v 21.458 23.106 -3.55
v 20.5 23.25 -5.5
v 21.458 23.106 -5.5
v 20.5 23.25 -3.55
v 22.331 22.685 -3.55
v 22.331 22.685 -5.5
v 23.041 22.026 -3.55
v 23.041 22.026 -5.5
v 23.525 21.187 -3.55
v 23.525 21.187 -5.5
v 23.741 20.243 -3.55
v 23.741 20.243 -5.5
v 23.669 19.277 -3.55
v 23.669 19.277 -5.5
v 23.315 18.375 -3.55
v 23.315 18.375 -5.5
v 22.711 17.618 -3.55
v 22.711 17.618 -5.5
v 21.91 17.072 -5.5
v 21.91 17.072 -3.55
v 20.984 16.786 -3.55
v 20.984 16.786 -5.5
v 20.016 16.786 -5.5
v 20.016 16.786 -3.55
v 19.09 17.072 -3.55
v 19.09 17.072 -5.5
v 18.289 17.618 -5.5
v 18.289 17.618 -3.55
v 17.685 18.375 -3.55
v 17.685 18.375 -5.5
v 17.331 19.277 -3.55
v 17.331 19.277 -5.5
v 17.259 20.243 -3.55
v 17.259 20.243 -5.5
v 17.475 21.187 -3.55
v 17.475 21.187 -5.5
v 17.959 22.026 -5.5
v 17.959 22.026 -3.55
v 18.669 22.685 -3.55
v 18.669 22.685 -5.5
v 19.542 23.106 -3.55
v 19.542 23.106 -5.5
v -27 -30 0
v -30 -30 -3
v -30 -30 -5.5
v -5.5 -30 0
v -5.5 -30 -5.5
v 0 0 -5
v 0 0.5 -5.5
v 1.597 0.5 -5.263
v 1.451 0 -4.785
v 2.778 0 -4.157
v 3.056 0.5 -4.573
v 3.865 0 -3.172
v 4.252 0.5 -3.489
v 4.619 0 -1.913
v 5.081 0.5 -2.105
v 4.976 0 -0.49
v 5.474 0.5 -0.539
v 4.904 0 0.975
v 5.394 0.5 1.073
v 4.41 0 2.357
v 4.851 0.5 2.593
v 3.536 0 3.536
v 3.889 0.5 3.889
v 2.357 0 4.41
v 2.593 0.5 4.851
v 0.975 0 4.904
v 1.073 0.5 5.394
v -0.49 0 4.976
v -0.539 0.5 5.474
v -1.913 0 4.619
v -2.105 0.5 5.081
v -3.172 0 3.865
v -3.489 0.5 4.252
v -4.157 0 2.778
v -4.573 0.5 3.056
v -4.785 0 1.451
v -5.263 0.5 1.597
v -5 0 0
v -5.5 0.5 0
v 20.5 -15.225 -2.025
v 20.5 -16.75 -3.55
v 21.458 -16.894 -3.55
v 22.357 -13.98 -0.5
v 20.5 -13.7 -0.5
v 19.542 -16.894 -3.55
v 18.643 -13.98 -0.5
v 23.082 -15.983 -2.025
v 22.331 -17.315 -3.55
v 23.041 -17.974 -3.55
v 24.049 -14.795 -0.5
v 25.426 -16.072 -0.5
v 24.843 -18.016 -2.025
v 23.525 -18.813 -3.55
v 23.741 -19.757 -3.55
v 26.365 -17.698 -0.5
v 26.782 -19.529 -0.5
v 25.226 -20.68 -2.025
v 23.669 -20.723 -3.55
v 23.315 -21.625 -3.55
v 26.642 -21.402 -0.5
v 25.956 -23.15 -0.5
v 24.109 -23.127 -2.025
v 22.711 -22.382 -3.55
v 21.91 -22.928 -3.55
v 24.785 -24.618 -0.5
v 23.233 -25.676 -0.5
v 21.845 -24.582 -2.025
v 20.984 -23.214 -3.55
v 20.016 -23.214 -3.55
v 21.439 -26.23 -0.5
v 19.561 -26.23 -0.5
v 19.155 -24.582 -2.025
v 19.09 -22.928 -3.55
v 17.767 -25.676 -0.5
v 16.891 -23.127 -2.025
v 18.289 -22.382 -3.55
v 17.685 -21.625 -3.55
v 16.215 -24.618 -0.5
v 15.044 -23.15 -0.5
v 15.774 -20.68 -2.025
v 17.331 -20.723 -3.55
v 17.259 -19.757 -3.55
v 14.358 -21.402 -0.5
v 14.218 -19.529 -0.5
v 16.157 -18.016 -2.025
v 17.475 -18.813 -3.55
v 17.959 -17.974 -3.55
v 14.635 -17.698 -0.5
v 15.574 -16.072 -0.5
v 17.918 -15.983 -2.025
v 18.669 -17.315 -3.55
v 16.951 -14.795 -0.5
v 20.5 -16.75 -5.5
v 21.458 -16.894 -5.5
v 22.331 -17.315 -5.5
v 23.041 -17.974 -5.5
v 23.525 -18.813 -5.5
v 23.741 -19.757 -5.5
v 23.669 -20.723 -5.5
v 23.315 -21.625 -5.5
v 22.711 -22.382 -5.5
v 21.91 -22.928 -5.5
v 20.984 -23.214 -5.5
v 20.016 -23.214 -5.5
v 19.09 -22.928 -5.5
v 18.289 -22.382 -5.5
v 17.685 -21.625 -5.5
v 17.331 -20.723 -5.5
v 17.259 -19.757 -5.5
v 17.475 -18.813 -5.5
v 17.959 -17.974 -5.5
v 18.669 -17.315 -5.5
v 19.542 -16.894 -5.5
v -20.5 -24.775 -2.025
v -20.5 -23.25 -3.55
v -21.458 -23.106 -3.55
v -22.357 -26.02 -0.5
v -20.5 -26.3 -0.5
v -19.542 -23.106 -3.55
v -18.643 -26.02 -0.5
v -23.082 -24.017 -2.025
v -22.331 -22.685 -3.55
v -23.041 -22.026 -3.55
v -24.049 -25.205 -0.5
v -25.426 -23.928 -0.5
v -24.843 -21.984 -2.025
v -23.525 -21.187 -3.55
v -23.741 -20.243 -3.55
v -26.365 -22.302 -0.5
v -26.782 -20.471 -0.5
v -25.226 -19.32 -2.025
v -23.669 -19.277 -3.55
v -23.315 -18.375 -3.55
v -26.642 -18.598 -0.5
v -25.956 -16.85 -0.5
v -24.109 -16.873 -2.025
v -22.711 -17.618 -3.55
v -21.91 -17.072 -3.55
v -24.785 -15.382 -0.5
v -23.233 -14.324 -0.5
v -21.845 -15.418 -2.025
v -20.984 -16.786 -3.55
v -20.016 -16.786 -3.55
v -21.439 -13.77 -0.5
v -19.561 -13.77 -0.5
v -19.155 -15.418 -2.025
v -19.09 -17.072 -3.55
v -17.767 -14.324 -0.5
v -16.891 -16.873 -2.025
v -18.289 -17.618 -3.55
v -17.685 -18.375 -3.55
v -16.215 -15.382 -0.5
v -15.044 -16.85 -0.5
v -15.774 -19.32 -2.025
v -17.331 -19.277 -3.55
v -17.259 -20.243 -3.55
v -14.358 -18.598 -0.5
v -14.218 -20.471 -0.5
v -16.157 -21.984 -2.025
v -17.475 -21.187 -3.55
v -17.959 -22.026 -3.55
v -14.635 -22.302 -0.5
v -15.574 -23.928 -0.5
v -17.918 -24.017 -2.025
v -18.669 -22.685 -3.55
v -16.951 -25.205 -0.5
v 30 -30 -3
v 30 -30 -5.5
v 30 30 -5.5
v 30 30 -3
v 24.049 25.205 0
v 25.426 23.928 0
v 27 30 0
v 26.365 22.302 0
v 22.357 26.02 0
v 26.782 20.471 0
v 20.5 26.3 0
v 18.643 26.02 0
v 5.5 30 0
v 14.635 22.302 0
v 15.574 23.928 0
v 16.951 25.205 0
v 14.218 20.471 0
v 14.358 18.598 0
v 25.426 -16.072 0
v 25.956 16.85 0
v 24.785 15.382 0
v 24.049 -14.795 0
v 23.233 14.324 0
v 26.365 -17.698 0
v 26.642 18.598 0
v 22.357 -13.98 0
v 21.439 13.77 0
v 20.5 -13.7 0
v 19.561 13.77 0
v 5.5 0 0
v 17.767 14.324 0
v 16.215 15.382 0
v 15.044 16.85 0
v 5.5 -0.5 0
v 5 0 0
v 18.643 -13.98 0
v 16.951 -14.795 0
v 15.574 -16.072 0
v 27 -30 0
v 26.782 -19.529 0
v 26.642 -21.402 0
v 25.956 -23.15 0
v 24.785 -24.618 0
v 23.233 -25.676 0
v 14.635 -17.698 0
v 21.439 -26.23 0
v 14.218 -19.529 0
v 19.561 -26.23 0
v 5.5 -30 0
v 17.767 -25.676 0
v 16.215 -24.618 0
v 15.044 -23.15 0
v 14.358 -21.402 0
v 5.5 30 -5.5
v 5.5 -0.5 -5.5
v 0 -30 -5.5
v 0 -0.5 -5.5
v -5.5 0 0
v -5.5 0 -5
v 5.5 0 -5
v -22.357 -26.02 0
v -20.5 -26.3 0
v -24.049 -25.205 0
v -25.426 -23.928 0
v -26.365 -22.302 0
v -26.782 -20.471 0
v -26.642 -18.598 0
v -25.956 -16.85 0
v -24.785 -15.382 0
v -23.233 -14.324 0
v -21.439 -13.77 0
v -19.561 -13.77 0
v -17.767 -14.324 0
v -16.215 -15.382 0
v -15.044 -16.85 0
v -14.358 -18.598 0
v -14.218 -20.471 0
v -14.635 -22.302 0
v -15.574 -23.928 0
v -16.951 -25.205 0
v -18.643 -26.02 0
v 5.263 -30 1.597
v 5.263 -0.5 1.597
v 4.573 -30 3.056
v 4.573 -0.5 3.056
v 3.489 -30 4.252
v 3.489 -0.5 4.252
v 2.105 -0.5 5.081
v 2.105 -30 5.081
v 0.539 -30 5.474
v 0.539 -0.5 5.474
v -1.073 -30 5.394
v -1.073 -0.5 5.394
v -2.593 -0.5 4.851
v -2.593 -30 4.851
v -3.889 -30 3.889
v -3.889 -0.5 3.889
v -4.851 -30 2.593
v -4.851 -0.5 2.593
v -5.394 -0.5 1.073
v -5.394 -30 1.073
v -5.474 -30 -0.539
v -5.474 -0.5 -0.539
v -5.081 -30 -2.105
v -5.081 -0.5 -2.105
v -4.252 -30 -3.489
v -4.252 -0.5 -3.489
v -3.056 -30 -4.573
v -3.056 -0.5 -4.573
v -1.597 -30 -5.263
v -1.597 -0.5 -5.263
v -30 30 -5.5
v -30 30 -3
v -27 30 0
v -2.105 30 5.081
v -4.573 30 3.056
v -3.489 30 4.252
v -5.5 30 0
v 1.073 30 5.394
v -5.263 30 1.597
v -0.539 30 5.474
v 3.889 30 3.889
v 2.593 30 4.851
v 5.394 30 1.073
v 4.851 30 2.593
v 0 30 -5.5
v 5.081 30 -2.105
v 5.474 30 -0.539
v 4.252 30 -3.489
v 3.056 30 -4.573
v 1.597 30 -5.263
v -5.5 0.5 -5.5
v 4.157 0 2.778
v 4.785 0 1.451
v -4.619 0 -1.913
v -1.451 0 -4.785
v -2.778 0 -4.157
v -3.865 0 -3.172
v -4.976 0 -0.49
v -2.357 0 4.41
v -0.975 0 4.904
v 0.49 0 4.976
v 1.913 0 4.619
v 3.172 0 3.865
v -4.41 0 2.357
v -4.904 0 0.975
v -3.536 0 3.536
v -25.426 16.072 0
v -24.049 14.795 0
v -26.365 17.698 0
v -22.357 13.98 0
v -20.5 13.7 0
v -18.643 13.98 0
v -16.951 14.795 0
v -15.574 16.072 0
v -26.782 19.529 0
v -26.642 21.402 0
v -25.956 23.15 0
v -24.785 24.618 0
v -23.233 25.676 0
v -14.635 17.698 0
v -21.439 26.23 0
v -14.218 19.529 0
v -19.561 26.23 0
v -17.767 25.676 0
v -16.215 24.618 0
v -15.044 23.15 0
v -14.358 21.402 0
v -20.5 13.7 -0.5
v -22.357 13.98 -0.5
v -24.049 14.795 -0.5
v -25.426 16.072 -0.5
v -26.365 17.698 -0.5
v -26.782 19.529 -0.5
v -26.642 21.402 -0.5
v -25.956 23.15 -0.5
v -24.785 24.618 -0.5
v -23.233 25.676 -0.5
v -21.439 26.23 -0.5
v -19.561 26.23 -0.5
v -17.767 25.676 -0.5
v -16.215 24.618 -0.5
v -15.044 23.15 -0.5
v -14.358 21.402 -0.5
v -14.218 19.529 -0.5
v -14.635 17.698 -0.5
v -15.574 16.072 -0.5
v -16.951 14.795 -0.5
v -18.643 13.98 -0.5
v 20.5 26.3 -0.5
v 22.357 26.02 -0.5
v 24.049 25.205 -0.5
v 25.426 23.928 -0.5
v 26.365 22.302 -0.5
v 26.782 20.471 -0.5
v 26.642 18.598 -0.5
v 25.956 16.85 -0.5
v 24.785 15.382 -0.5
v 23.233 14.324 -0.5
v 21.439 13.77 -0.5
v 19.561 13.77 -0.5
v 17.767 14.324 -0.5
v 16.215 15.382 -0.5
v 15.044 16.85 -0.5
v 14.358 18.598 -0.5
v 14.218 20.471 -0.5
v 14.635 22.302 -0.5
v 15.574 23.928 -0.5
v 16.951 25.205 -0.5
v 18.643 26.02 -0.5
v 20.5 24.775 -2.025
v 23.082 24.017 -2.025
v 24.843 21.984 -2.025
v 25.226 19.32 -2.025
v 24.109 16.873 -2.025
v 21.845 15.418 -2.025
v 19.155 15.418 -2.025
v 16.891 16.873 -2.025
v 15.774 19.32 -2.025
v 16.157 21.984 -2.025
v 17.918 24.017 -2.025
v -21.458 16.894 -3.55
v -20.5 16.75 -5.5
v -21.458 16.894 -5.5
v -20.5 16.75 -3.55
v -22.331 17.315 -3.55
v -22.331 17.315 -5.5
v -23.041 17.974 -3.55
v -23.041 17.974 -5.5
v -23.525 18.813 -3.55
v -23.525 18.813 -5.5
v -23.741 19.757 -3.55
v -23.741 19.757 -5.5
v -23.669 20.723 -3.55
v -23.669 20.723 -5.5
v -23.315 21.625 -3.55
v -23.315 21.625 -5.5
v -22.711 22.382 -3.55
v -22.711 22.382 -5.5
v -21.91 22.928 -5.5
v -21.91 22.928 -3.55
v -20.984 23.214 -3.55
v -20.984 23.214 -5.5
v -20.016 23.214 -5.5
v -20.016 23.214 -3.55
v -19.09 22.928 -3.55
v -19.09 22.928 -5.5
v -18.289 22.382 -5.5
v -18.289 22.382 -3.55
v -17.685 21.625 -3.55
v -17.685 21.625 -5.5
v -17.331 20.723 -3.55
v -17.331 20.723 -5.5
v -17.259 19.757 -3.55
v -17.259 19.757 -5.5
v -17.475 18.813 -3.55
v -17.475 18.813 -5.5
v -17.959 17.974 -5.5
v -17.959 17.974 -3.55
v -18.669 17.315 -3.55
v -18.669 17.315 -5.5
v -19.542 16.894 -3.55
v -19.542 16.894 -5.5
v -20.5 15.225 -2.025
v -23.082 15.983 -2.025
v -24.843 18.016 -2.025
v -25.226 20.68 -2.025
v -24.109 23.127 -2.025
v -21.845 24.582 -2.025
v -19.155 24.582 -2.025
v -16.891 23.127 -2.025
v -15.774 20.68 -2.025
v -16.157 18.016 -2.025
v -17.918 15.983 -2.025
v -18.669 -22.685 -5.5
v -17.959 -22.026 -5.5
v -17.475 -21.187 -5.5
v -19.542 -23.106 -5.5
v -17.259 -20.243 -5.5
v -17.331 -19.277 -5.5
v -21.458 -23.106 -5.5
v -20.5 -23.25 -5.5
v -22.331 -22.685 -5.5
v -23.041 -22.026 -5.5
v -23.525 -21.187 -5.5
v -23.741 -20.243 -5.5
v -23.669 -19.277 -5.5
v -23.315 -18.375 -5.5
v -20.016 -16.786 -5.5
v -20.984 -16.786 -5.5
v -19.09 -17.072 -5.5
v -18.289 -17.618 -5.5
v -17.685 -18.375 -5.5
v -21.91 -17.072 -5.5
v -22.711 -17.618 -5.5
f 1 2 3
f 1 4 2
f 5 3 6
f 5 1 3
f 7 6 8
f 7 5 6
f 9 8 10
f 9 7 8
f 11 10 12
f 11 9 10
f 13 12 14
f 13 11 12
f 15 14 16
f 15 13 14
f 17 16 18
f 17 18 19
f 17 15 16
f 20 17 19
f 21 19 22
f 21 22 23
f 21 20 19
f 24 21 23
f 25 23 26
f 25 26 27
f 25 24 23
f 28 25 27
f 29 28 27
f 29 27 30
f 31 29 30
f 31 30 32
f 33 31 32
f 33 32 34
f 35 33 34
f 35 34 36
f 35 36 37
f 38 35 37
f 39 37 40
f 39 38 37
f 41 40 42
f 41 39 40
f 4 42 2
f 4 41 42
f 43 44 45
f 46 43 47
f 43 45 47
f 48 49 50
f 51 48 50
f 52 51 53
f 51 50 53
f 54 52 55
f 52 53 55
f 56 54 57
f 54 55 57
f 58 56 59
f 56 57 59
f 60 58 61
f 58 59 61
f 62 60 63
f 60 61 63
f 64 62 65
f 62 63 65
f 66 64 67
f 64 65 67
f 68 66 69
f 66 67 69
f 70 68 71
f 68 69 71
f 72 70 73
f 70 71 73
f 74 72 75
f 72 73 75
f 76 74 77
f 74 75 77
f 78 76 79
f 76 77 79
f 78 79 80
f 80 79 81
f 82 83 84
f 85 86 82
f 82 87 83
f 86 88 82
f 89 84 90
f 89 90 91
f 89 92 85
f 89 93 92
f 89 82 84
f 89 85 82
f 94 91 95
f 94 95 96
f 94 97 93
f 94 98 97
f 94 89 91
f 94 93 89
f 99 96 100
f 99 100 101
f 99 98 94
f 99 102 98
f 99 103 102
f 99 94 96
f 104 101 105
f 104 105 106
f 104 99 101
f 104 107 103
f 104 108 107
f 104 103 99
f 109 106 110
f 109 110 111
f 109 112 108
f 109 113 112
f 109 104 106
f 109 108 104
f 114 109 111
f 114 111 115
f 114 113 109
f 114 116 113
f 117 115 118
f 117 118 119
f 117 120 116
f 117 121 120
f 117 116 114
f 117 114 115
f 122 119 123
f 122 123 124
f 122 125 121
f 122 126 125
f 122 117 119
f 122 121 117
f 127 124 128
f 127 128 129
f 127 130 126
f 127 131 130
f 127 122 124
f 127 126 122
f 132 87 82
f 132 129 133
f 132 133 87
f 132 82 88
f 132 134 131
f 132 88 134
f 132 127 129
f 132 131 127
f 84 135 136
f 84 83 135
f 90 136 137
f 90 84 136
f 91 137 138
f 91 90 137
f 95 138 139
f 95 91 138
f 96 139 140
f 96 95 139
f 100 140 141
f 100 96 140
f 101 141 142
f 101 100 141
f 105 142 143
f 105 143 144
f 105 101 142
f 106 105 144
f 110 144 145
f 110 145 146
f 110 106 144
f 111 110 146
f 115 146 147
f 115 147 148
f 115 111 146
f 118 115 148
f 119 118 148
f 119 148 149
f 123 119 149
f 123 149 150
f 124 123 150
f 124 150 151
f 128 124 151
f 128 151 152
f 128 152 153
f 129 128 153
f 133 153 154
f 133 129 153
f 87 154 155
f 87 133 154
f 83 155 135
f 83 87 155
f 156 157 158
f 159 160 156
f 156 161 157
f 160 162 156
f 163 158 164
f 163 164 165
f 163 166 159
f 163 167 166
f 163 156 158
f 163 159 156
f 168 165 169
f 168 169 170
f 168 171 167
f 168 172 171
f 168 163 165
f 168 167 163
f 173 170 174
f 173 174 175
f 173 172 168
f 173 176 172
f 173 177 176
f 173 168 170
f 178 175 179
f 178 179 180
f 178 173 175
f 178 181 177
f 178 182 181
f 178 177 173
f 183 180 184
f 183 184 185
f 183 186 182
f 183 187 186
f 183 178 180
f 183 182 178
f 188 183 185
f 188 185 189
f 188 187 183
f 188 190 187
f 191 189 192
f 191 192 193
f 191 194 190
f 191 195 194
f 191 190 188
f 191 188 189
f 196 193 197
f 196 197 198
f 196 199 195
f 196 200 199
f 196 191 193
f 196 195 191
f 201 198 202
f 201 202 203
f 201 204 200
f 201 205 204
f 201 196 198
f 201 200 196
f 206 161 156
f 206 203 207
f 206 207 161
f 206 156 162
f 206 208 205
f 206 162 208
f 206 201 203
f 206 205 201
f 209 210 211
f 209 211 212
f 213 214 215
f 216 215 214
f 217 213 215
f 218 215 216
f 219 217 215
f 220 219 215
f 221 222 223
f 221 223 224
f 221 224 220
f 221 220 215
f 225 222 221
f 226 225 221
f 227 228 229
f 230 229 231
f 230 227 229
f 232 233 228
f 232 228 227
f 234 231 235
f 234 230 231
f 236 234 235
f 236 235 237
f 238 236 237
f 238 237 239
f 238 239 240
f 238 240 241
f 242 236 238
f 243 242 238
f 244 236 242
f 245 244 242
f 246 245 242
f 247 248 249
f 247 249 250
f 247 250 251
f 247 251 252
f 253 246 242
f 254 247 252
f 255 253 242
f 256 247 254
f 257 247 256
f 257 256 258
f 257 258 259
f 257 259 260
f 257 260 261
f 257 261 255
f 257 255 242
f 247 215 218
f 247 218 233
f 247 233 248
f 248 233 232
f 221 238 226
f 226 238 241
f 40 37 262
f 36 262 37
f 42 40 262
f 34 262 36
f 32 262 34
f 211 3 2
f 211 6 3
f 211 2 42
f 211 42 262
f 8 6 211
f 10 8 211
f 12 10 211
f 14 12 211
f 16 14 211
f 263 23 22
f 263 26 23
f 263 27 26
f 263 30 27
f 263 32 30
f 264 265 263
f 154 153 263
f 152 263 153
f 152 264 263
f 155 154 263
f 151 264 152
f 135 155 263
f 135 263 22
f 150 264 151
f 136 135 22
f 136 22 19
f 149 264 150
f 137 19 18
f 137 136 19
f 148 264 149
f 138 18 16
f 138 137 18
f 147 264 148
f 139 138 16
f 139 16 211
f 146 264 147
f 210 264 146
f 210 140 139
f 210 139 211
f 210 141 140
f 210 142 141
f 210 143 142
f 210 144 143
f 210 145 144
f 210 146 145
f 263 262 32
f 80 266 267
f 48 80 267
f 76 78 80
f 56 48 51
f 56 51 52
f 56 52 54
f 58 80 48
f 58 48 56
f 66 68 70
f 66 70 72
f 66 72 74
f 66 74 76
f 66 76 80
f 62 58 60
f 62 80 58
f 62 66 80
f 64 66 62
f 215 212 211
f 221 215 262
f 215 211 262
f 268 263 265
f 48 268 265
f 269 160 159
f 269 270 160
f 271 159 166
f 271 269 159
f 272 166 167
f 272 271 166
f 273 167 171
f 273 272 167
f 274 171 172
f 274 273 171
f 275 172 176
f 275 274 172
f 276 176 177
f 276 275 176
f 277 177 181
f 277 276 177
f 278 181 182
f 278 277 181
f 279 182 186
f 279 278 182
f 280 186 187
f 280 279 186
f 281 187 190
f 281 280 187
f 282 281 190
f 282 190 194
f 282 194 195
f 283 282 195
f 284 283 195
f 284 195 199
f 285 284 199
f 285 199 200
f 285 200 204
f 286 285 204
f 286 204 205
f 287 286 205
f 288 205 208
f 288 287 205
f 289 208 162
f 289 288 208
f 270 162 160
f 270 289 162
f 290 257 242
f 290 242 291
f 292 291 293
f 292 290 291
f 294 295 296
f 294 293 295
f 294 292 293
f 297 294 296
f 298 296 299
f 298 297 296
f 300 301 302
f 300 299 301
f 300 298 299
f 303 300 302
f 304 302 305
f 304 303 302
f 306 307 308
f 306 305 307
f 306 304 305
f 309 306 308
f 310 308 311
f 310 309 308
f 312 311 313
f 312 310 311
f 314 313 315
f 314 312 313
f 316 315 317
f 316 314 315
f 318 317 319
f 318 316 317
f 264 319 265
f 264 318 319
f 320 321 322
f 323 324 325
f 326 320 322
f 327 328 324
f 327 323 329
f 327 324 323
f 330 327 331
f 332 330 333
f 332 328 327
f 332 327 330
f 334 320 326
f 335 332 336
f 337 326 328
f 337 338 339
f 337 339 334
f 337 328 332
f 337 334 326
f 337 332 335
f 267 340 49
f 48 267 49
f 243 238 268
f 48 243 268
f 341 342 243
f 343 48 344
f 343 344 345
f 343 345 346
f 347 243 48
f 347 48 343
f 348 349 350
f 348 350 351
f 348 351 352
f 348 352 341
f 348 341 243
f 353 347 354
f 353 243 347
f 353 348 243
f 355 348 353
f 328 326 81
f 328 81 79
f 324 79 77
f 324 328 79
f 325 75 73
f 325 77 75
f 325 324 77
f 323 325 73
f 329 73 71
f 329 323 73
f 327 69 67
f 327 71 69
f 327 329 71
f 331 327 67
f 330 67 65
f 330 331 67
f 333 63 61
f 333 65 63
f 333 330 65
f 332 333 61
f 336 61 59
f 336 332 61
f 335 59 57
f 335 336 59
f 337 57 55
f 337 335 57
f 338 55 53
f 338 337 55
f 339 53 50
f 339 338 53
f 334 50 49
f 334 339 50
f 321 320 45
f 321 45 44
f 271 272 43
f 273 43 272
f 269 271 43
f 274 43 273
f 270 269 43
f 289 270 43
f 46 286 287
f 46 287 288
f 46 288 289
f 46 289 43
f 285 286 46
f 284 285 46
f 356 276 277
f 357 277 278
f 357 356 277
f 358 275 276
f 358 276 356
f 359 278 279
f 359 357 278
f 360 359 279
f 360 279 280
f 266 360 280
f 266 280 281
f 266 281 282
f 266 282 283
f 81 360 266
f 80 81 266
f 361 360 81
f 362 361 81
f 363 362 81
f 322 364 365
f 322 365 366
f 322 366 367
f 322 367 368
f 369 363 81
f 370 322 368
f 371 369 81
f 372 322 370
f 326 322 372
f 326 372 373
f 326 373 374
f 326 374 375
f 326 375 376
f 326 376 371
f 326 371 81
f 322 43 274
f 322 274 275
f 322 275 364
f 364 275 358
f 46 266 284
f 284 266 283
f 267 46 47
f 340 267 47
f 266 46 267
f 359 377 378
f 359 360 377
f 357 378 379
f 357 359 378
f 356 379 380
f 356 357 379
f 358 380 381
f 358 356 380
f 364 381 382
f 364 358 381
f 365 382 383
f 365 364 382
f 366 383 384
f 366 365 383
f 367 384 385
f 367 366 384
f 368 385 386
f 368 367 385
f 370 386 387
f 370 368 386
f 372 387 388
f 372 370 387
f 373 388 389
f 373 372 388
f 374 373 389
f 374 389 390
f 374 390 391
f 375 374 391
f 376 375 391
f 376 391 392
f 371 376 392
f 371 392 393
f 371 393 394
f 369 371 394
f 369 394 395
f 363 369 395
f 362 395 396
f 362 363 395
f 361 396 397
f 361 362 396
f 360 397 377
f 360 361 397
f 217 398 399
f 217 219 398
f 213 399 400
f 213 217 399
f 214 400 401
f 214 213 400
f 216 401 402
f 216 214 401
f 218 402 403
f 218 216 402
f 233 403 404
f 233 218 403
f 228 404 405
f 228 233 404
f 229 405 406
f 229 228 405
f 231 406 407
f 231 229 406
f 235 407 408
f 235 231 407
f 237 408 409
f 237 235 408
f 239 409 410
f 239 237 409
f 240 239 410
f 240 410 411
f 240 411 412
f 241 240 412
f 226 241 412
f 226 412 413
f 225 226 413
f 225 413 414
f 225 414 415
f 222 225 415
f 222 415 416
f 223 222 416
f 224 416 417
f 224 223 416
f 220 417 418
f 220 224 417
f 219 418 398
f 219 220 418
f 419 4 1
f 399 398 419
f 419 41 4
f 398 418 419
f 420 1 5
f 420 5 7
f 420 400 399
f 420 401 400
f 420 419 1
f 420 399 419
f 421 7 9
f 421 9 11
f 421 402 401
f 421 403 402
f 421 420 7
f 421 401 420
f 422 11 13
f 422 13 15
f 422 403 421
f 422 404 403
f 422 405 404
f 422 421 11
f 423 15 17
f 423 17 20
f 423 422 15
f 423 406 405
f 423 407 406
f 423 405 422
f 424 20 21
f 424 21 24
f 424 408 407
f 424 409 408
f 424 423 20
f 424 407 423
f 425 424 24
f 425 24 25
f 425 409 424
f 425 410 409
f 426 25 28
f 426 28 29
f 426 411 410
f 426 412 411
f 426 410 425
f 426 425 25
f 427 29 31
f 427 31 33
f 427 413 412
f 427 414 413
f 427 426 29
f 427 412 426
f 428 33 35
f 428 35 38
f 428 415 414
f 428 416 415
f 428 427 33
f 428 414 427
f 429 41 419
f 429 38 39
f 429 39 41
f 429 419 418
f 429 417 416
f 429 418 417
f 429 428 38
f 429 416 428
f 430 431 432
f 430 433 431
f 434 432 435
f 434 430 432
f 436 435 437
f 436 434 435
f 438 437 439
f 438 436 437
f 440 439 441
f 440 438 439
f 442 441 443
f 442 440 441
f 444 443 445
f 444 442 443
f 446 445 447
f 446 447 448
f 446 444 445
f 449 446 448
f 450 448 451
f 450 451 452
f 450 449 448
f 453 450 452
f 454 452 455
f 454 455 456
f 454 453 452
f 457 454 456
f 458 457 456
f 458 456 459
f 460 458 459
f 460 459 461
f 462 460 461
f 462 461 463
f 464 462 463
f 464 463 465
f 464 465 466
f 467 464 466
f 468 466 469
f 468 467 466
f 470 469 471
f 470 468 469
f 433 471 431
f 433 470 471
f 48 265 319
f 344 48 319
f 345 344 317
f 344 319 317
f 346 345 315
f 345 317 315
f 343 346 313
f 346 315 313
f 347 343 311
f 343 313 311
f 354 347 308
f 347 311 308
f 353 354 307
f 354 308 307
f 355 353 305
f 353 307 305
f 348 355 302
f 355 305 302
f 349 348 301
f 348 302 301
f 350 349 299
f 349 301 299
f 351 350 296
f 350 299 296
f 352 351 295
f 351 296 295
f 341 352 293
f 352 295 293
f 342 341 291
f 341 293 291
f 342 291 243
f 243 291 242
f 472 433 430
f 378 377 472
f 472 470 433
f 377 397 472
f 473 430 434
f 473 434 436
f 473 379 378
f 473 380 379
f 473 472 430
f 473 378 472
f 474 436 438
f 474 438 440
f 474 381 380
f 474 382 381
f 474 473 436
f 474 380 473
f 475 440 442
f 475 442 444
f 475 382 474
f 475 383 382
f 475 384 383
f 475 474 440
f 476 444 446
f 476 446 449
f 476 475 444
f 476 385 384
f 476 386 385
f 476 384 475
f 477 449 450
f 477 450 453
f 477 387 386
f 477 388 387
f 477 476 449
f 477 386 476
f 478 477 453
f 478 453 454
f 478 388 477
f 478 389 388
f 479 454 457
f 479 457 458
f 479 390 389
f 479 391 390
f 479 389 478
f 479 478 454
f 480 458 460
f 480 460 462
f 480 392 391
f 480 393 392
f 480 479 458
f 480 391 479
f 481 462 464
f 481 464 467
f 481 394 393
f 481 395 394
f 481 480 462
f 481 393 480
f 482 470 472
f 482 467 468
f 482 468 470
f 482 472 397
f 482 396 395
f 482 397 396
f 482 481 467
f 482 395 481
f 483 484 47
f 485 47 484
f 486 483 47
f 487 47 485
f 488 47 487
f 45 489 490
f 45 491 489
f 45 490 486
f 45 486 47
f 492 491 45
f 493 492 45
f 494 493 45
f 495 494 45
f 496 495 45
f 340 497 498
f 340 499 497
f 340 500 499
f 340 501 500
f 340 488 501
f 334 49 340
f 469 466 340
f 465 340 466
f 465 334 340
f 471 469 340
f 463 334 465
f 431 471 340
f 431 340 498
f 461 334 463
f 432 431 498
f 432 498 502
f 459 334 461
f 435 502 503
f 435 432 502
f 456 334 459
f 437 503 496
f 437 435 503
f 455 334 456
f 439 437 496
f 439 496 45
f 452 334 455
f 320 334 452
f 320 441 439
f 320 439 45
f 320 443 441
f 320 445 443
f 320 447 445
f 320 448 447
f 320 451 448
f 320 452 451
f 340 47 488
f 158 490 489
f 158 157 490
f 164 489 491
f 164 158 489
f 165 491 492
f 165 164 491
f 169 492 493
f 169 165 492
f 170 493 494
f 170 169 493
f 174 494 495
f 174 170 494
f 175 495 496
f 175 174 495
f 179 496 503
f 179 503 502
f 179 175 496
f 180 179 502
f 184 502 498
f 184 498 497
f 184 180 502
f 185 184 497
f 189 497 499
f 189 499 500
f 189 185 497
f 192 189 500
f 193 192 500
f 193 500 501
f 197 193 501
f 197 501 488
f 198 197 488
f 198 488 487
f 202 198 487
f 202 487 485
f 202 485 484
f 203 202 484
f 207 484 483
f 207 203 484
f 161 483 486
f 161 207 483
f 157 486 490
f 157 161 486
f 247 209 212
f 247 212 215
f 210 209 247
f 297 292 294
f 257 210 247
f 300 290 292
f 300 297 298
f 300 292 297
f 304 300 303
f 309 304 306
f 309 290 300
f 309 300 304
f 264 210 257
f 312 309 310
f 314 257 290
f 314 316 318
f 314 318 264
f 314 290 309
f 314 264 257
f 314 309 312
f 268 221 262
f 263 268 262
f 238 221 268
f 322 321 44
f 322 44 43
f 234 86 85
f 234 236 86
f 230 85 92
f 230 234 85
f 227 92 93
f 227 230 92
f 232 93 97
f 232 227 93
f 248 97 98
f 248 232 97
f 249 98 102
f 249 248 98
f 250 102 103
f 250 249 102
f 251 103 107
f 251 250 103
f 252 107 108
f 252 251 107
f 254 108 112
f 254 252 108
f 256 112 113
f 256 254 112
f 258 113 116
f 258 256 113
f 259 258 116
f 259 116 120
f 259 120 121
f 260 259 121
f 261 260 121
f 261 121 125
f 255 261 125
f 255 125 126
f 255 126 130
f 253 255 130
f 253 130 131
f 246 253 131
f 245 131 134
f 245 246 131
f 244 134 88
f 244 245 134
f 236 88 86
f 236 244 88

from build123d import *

# Parameters (mm, degrees)
EXTRUDE_1_DEPTH            = 30
SKETCH_3_W                 = 11
SKETCH_3_H                 = 30
CUT_EXTRUDE_1_DEPTH        = 6.5
CUT_EXTRUDE_1_DEPTH_BACK   = 6.5
HOLE_WIZARD_M61_AT_2_COUNT = 2
HOLE_WIZARD_M61_AT_2_PITCH = 40
CHAMFER_1_SIZE             = 0.5
PATTERN_CIRCULAR_1_COUNT   = 2


with BuildPart() as part:
    # Эскиз1 → Бобышка-Вытянуть1 (new body, symmetric)
    with BuildSketch(Plane(origin=(0, 0, 0), x_dir=(1, 0, 0), z_dir=(0, 1, 0))):
        with BuildLine():
            Line((0, 5.5), (-30, 5.5))
            Line((-30, 5.5), (-30, 3))
            Line((-30, 3), (-27, 0))
            Line((-27, 0), (-5.5, 0))
            ThreePointArc((-5.5, 0), (3.889087297, -3.889087297), (0, 5.5))
        make_face()
    extrude(amount=EXTRUDE_1_DEPTH, both=True)

    # Эскиз3 → Вырез-Вытянуть1 (cut, two sides)
    with BuildSketch(Plane.XY) as cut_extrude_1_sk:
        with Locations((0, -15)):
            Rectangle(SKETCH_3_W, SKETCH_3_H)
    extrude(amount=CUT_EXTRUDE_1_DEPTH, mode=Mode.SUBTRACT)
    extrude(cut_extrude_1_sk.sketch, amount=-CUT_EXTRUDE_1_DEPTH_BACK, mode=Mode.SUBTRACT)

    # Эскиз6 → Зенковка для винта с полупотайной головкой M61 (revolve, cut)
    with BuildSketch(Plane(origin=(-20.5, 20, 0), x_dir=(0, -1, 0), z_dir=(1, 0, 0))):
        Polygon((0, 0), (0, 5.5), (3.25, 5.5), (3.25, 3.55), (6.3, 0.5), (6.3, 0), align=None)
    hole_wizard_m61 = revolve(axis=Axis((-20.5, 20, 6.35), (0, 0, -1)), mode=Mode.SUBTRACT)

    # Зенковка для винта с полупотайной головкой M61 at 2: Зенковка для винта с полупотайной головкой M61 ×2
    with Locations(*[(0, -i * HOLE_WIZARD_M61_AT_2_PITCH, 0) for i in range(1, HOLE_WIZARD_M61_AT_2_COUNT)]):
        add(hole_wizard_m61, mode=Mode.SUBTRACT)

    # Фаска1
    chamfer_1_edges = [part.edges().sort_by_distance(p)[0] for p in [
        (3.889087297, 0, 3.889087297),
        (-2.75, 0, -5.5),
    ]]
    chamfer(chamfer_1_edges, length=CHAMFER_1_SIZE)


with BuildPart() as pattern_circular_1_1:
    # Круговой массив1: pattern copy
    add(part.part.rotate(Axis((0, 0, 0), (0, 0, 1)), 1 * 360 / PATTERN_CIRCULAR_1_COUNT))


solid = Compound([part.part, pattern_circular_1_1.part])
